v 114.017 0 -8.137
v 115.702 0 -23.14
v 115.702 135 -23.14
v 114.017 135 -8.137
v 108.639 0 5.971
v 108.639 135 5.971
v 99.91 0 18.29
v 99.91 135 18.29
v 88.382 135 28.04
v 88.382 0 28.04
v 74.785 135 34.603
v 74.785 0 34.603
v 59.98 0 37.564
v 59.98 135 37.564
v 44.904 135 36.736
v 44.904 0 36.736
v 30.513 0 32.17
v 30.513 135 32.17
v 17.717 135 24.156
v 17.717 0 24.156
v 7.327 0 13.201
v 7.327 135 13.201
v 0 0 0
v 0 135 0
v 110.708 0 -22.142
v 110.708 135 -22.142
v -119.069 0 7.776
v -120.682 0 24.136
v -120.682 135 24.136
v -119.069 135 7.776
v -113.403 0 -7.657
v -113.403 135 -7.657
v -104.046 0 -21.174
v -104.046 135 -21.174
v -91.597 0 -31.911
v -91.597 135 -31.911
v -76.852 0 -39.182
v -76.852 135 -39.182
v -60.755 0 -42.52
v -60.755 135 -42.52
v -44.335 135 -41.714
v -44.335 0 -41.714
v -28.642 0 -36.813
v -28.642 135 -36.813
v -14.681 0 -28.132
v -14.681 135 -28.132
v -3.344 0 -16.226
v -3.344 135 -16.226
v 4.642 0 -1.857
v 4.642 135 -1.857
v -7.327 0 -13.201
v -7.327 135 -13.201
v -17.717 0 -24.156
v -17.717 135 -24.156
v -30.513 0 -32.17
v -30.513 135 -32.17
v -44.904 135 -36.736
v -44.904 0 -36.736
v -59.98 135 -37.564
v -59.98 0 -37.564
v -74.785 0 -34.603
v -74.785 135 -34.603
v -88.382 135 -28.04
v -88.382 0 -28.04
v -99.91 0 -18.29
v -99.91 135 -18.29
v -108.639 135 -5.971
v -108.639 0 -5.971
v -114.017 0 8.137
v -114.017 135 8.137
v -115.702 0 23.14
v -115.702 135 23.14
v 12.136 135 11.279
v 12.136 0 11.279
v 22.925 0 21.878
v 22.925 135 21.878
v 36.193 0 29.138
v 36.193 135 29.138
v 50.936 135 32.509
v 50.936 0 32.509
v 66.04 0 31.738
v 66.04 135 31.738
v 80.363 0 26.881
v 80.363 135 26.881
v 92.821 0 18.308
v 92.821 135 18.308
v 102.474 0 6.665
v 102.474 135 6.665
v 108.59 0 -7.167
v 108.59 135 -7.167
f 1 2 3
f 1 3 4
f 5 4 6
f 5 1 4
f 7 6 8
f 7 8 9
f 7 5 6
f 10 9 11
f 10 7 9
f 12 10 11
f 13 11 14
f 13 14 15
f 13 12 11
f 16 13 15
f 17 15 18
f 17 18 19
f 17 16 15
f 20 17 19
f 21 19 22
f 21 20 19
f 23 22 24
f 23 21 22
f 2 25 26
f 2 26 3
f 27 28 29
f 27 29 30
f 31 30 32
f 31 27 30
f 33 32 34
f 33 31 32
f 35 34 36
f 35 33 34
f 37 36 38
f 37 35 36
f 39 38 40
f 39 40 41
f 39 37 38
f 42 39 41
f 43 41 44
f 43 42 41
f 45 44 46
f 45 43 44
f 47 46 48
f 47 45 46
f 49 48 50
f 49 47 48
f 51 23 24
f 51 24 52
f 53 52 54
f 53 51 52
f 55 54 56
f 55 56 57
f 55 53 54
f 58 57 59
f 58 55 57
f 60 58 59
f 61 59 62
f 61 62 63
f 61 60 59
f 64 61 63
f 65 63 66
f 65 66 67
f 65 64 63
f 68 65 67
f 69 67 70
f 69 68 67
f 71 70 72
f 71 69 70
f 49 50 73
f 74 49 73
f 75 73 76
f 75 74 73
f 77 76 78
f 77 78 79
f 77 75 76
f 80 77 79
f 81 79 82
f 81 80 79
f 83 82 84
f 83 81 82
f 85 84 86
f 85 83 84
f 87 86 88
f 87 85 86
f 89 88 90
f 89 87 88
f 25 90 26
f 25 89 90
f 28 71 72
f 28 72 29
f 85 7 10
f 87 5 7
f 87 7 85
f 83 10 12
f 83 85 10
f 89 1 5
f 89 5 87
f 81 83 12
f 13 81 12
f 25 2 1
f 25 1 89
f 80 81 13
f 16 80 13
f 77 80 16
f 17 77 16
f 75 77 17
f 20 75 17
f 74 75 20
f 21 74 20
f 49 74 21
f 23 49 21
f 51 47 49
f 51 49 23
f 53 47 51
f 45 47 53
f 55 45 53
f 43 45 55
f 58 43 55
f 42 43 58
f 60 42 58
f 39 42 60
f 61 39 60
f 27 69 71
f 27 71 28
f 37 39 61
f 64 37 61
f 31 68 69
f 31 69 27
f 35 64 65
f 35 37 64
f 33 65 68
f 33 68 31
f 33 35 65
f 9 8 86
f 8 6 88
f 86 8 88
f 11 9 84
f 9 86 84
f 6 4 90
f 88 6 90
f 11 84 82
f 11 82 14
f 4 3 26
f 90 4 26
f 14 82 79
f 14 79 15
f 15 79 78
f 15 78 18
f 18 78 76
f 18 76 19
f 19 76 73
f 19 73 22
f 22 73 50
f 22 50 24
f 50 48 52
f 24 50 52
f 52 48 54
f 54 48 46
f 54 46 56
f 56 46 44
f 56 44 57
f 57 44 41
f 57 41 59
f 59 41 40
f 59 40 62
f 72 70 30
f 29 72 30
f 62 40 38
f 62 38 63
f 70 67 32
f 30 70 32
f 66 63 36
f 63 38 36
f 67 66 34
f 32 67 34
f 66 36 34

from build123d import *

# Parameters (mm, degrees)
EXTRUDE_1_DEPTH = 135


with BuildPart() as part:
    # Эскиз4 → Бобышка-Вытянуть1 (new body)
    with BuildSketch(Plane(origin=(0, 0, 0), x_dir=(1, 0, 0), z_dir=(0, 1, 0))):
        with BuildLine():
            Line((110.708418771, 22.141683754), (115.702479941, 23.140495988))
            ThreePointArc((115.702479941, 23.140495988), (67.475569561, -36.55139996), (0, 0))
            ThreePointArc((0, 0), (-67.475569561, 36.55139996), (-115.702479941, -23.140495988))
            Line((-115.702479941, -23.140495988), (-120.682183817, -24.136436763))
            ThreePointArc((-120.682183817, -24.136436763), (-68.909214493, 41.362013423), (4.642383454, 1.856953382))
            ThreePointArc((4.642383454, 1.856953382), (66.039906911, -31.737519495), (110.708418771, 22.141683754))
        make_face()
    extrude(amount=EXTRUDE_1_DEPTH)


solid = part.part
